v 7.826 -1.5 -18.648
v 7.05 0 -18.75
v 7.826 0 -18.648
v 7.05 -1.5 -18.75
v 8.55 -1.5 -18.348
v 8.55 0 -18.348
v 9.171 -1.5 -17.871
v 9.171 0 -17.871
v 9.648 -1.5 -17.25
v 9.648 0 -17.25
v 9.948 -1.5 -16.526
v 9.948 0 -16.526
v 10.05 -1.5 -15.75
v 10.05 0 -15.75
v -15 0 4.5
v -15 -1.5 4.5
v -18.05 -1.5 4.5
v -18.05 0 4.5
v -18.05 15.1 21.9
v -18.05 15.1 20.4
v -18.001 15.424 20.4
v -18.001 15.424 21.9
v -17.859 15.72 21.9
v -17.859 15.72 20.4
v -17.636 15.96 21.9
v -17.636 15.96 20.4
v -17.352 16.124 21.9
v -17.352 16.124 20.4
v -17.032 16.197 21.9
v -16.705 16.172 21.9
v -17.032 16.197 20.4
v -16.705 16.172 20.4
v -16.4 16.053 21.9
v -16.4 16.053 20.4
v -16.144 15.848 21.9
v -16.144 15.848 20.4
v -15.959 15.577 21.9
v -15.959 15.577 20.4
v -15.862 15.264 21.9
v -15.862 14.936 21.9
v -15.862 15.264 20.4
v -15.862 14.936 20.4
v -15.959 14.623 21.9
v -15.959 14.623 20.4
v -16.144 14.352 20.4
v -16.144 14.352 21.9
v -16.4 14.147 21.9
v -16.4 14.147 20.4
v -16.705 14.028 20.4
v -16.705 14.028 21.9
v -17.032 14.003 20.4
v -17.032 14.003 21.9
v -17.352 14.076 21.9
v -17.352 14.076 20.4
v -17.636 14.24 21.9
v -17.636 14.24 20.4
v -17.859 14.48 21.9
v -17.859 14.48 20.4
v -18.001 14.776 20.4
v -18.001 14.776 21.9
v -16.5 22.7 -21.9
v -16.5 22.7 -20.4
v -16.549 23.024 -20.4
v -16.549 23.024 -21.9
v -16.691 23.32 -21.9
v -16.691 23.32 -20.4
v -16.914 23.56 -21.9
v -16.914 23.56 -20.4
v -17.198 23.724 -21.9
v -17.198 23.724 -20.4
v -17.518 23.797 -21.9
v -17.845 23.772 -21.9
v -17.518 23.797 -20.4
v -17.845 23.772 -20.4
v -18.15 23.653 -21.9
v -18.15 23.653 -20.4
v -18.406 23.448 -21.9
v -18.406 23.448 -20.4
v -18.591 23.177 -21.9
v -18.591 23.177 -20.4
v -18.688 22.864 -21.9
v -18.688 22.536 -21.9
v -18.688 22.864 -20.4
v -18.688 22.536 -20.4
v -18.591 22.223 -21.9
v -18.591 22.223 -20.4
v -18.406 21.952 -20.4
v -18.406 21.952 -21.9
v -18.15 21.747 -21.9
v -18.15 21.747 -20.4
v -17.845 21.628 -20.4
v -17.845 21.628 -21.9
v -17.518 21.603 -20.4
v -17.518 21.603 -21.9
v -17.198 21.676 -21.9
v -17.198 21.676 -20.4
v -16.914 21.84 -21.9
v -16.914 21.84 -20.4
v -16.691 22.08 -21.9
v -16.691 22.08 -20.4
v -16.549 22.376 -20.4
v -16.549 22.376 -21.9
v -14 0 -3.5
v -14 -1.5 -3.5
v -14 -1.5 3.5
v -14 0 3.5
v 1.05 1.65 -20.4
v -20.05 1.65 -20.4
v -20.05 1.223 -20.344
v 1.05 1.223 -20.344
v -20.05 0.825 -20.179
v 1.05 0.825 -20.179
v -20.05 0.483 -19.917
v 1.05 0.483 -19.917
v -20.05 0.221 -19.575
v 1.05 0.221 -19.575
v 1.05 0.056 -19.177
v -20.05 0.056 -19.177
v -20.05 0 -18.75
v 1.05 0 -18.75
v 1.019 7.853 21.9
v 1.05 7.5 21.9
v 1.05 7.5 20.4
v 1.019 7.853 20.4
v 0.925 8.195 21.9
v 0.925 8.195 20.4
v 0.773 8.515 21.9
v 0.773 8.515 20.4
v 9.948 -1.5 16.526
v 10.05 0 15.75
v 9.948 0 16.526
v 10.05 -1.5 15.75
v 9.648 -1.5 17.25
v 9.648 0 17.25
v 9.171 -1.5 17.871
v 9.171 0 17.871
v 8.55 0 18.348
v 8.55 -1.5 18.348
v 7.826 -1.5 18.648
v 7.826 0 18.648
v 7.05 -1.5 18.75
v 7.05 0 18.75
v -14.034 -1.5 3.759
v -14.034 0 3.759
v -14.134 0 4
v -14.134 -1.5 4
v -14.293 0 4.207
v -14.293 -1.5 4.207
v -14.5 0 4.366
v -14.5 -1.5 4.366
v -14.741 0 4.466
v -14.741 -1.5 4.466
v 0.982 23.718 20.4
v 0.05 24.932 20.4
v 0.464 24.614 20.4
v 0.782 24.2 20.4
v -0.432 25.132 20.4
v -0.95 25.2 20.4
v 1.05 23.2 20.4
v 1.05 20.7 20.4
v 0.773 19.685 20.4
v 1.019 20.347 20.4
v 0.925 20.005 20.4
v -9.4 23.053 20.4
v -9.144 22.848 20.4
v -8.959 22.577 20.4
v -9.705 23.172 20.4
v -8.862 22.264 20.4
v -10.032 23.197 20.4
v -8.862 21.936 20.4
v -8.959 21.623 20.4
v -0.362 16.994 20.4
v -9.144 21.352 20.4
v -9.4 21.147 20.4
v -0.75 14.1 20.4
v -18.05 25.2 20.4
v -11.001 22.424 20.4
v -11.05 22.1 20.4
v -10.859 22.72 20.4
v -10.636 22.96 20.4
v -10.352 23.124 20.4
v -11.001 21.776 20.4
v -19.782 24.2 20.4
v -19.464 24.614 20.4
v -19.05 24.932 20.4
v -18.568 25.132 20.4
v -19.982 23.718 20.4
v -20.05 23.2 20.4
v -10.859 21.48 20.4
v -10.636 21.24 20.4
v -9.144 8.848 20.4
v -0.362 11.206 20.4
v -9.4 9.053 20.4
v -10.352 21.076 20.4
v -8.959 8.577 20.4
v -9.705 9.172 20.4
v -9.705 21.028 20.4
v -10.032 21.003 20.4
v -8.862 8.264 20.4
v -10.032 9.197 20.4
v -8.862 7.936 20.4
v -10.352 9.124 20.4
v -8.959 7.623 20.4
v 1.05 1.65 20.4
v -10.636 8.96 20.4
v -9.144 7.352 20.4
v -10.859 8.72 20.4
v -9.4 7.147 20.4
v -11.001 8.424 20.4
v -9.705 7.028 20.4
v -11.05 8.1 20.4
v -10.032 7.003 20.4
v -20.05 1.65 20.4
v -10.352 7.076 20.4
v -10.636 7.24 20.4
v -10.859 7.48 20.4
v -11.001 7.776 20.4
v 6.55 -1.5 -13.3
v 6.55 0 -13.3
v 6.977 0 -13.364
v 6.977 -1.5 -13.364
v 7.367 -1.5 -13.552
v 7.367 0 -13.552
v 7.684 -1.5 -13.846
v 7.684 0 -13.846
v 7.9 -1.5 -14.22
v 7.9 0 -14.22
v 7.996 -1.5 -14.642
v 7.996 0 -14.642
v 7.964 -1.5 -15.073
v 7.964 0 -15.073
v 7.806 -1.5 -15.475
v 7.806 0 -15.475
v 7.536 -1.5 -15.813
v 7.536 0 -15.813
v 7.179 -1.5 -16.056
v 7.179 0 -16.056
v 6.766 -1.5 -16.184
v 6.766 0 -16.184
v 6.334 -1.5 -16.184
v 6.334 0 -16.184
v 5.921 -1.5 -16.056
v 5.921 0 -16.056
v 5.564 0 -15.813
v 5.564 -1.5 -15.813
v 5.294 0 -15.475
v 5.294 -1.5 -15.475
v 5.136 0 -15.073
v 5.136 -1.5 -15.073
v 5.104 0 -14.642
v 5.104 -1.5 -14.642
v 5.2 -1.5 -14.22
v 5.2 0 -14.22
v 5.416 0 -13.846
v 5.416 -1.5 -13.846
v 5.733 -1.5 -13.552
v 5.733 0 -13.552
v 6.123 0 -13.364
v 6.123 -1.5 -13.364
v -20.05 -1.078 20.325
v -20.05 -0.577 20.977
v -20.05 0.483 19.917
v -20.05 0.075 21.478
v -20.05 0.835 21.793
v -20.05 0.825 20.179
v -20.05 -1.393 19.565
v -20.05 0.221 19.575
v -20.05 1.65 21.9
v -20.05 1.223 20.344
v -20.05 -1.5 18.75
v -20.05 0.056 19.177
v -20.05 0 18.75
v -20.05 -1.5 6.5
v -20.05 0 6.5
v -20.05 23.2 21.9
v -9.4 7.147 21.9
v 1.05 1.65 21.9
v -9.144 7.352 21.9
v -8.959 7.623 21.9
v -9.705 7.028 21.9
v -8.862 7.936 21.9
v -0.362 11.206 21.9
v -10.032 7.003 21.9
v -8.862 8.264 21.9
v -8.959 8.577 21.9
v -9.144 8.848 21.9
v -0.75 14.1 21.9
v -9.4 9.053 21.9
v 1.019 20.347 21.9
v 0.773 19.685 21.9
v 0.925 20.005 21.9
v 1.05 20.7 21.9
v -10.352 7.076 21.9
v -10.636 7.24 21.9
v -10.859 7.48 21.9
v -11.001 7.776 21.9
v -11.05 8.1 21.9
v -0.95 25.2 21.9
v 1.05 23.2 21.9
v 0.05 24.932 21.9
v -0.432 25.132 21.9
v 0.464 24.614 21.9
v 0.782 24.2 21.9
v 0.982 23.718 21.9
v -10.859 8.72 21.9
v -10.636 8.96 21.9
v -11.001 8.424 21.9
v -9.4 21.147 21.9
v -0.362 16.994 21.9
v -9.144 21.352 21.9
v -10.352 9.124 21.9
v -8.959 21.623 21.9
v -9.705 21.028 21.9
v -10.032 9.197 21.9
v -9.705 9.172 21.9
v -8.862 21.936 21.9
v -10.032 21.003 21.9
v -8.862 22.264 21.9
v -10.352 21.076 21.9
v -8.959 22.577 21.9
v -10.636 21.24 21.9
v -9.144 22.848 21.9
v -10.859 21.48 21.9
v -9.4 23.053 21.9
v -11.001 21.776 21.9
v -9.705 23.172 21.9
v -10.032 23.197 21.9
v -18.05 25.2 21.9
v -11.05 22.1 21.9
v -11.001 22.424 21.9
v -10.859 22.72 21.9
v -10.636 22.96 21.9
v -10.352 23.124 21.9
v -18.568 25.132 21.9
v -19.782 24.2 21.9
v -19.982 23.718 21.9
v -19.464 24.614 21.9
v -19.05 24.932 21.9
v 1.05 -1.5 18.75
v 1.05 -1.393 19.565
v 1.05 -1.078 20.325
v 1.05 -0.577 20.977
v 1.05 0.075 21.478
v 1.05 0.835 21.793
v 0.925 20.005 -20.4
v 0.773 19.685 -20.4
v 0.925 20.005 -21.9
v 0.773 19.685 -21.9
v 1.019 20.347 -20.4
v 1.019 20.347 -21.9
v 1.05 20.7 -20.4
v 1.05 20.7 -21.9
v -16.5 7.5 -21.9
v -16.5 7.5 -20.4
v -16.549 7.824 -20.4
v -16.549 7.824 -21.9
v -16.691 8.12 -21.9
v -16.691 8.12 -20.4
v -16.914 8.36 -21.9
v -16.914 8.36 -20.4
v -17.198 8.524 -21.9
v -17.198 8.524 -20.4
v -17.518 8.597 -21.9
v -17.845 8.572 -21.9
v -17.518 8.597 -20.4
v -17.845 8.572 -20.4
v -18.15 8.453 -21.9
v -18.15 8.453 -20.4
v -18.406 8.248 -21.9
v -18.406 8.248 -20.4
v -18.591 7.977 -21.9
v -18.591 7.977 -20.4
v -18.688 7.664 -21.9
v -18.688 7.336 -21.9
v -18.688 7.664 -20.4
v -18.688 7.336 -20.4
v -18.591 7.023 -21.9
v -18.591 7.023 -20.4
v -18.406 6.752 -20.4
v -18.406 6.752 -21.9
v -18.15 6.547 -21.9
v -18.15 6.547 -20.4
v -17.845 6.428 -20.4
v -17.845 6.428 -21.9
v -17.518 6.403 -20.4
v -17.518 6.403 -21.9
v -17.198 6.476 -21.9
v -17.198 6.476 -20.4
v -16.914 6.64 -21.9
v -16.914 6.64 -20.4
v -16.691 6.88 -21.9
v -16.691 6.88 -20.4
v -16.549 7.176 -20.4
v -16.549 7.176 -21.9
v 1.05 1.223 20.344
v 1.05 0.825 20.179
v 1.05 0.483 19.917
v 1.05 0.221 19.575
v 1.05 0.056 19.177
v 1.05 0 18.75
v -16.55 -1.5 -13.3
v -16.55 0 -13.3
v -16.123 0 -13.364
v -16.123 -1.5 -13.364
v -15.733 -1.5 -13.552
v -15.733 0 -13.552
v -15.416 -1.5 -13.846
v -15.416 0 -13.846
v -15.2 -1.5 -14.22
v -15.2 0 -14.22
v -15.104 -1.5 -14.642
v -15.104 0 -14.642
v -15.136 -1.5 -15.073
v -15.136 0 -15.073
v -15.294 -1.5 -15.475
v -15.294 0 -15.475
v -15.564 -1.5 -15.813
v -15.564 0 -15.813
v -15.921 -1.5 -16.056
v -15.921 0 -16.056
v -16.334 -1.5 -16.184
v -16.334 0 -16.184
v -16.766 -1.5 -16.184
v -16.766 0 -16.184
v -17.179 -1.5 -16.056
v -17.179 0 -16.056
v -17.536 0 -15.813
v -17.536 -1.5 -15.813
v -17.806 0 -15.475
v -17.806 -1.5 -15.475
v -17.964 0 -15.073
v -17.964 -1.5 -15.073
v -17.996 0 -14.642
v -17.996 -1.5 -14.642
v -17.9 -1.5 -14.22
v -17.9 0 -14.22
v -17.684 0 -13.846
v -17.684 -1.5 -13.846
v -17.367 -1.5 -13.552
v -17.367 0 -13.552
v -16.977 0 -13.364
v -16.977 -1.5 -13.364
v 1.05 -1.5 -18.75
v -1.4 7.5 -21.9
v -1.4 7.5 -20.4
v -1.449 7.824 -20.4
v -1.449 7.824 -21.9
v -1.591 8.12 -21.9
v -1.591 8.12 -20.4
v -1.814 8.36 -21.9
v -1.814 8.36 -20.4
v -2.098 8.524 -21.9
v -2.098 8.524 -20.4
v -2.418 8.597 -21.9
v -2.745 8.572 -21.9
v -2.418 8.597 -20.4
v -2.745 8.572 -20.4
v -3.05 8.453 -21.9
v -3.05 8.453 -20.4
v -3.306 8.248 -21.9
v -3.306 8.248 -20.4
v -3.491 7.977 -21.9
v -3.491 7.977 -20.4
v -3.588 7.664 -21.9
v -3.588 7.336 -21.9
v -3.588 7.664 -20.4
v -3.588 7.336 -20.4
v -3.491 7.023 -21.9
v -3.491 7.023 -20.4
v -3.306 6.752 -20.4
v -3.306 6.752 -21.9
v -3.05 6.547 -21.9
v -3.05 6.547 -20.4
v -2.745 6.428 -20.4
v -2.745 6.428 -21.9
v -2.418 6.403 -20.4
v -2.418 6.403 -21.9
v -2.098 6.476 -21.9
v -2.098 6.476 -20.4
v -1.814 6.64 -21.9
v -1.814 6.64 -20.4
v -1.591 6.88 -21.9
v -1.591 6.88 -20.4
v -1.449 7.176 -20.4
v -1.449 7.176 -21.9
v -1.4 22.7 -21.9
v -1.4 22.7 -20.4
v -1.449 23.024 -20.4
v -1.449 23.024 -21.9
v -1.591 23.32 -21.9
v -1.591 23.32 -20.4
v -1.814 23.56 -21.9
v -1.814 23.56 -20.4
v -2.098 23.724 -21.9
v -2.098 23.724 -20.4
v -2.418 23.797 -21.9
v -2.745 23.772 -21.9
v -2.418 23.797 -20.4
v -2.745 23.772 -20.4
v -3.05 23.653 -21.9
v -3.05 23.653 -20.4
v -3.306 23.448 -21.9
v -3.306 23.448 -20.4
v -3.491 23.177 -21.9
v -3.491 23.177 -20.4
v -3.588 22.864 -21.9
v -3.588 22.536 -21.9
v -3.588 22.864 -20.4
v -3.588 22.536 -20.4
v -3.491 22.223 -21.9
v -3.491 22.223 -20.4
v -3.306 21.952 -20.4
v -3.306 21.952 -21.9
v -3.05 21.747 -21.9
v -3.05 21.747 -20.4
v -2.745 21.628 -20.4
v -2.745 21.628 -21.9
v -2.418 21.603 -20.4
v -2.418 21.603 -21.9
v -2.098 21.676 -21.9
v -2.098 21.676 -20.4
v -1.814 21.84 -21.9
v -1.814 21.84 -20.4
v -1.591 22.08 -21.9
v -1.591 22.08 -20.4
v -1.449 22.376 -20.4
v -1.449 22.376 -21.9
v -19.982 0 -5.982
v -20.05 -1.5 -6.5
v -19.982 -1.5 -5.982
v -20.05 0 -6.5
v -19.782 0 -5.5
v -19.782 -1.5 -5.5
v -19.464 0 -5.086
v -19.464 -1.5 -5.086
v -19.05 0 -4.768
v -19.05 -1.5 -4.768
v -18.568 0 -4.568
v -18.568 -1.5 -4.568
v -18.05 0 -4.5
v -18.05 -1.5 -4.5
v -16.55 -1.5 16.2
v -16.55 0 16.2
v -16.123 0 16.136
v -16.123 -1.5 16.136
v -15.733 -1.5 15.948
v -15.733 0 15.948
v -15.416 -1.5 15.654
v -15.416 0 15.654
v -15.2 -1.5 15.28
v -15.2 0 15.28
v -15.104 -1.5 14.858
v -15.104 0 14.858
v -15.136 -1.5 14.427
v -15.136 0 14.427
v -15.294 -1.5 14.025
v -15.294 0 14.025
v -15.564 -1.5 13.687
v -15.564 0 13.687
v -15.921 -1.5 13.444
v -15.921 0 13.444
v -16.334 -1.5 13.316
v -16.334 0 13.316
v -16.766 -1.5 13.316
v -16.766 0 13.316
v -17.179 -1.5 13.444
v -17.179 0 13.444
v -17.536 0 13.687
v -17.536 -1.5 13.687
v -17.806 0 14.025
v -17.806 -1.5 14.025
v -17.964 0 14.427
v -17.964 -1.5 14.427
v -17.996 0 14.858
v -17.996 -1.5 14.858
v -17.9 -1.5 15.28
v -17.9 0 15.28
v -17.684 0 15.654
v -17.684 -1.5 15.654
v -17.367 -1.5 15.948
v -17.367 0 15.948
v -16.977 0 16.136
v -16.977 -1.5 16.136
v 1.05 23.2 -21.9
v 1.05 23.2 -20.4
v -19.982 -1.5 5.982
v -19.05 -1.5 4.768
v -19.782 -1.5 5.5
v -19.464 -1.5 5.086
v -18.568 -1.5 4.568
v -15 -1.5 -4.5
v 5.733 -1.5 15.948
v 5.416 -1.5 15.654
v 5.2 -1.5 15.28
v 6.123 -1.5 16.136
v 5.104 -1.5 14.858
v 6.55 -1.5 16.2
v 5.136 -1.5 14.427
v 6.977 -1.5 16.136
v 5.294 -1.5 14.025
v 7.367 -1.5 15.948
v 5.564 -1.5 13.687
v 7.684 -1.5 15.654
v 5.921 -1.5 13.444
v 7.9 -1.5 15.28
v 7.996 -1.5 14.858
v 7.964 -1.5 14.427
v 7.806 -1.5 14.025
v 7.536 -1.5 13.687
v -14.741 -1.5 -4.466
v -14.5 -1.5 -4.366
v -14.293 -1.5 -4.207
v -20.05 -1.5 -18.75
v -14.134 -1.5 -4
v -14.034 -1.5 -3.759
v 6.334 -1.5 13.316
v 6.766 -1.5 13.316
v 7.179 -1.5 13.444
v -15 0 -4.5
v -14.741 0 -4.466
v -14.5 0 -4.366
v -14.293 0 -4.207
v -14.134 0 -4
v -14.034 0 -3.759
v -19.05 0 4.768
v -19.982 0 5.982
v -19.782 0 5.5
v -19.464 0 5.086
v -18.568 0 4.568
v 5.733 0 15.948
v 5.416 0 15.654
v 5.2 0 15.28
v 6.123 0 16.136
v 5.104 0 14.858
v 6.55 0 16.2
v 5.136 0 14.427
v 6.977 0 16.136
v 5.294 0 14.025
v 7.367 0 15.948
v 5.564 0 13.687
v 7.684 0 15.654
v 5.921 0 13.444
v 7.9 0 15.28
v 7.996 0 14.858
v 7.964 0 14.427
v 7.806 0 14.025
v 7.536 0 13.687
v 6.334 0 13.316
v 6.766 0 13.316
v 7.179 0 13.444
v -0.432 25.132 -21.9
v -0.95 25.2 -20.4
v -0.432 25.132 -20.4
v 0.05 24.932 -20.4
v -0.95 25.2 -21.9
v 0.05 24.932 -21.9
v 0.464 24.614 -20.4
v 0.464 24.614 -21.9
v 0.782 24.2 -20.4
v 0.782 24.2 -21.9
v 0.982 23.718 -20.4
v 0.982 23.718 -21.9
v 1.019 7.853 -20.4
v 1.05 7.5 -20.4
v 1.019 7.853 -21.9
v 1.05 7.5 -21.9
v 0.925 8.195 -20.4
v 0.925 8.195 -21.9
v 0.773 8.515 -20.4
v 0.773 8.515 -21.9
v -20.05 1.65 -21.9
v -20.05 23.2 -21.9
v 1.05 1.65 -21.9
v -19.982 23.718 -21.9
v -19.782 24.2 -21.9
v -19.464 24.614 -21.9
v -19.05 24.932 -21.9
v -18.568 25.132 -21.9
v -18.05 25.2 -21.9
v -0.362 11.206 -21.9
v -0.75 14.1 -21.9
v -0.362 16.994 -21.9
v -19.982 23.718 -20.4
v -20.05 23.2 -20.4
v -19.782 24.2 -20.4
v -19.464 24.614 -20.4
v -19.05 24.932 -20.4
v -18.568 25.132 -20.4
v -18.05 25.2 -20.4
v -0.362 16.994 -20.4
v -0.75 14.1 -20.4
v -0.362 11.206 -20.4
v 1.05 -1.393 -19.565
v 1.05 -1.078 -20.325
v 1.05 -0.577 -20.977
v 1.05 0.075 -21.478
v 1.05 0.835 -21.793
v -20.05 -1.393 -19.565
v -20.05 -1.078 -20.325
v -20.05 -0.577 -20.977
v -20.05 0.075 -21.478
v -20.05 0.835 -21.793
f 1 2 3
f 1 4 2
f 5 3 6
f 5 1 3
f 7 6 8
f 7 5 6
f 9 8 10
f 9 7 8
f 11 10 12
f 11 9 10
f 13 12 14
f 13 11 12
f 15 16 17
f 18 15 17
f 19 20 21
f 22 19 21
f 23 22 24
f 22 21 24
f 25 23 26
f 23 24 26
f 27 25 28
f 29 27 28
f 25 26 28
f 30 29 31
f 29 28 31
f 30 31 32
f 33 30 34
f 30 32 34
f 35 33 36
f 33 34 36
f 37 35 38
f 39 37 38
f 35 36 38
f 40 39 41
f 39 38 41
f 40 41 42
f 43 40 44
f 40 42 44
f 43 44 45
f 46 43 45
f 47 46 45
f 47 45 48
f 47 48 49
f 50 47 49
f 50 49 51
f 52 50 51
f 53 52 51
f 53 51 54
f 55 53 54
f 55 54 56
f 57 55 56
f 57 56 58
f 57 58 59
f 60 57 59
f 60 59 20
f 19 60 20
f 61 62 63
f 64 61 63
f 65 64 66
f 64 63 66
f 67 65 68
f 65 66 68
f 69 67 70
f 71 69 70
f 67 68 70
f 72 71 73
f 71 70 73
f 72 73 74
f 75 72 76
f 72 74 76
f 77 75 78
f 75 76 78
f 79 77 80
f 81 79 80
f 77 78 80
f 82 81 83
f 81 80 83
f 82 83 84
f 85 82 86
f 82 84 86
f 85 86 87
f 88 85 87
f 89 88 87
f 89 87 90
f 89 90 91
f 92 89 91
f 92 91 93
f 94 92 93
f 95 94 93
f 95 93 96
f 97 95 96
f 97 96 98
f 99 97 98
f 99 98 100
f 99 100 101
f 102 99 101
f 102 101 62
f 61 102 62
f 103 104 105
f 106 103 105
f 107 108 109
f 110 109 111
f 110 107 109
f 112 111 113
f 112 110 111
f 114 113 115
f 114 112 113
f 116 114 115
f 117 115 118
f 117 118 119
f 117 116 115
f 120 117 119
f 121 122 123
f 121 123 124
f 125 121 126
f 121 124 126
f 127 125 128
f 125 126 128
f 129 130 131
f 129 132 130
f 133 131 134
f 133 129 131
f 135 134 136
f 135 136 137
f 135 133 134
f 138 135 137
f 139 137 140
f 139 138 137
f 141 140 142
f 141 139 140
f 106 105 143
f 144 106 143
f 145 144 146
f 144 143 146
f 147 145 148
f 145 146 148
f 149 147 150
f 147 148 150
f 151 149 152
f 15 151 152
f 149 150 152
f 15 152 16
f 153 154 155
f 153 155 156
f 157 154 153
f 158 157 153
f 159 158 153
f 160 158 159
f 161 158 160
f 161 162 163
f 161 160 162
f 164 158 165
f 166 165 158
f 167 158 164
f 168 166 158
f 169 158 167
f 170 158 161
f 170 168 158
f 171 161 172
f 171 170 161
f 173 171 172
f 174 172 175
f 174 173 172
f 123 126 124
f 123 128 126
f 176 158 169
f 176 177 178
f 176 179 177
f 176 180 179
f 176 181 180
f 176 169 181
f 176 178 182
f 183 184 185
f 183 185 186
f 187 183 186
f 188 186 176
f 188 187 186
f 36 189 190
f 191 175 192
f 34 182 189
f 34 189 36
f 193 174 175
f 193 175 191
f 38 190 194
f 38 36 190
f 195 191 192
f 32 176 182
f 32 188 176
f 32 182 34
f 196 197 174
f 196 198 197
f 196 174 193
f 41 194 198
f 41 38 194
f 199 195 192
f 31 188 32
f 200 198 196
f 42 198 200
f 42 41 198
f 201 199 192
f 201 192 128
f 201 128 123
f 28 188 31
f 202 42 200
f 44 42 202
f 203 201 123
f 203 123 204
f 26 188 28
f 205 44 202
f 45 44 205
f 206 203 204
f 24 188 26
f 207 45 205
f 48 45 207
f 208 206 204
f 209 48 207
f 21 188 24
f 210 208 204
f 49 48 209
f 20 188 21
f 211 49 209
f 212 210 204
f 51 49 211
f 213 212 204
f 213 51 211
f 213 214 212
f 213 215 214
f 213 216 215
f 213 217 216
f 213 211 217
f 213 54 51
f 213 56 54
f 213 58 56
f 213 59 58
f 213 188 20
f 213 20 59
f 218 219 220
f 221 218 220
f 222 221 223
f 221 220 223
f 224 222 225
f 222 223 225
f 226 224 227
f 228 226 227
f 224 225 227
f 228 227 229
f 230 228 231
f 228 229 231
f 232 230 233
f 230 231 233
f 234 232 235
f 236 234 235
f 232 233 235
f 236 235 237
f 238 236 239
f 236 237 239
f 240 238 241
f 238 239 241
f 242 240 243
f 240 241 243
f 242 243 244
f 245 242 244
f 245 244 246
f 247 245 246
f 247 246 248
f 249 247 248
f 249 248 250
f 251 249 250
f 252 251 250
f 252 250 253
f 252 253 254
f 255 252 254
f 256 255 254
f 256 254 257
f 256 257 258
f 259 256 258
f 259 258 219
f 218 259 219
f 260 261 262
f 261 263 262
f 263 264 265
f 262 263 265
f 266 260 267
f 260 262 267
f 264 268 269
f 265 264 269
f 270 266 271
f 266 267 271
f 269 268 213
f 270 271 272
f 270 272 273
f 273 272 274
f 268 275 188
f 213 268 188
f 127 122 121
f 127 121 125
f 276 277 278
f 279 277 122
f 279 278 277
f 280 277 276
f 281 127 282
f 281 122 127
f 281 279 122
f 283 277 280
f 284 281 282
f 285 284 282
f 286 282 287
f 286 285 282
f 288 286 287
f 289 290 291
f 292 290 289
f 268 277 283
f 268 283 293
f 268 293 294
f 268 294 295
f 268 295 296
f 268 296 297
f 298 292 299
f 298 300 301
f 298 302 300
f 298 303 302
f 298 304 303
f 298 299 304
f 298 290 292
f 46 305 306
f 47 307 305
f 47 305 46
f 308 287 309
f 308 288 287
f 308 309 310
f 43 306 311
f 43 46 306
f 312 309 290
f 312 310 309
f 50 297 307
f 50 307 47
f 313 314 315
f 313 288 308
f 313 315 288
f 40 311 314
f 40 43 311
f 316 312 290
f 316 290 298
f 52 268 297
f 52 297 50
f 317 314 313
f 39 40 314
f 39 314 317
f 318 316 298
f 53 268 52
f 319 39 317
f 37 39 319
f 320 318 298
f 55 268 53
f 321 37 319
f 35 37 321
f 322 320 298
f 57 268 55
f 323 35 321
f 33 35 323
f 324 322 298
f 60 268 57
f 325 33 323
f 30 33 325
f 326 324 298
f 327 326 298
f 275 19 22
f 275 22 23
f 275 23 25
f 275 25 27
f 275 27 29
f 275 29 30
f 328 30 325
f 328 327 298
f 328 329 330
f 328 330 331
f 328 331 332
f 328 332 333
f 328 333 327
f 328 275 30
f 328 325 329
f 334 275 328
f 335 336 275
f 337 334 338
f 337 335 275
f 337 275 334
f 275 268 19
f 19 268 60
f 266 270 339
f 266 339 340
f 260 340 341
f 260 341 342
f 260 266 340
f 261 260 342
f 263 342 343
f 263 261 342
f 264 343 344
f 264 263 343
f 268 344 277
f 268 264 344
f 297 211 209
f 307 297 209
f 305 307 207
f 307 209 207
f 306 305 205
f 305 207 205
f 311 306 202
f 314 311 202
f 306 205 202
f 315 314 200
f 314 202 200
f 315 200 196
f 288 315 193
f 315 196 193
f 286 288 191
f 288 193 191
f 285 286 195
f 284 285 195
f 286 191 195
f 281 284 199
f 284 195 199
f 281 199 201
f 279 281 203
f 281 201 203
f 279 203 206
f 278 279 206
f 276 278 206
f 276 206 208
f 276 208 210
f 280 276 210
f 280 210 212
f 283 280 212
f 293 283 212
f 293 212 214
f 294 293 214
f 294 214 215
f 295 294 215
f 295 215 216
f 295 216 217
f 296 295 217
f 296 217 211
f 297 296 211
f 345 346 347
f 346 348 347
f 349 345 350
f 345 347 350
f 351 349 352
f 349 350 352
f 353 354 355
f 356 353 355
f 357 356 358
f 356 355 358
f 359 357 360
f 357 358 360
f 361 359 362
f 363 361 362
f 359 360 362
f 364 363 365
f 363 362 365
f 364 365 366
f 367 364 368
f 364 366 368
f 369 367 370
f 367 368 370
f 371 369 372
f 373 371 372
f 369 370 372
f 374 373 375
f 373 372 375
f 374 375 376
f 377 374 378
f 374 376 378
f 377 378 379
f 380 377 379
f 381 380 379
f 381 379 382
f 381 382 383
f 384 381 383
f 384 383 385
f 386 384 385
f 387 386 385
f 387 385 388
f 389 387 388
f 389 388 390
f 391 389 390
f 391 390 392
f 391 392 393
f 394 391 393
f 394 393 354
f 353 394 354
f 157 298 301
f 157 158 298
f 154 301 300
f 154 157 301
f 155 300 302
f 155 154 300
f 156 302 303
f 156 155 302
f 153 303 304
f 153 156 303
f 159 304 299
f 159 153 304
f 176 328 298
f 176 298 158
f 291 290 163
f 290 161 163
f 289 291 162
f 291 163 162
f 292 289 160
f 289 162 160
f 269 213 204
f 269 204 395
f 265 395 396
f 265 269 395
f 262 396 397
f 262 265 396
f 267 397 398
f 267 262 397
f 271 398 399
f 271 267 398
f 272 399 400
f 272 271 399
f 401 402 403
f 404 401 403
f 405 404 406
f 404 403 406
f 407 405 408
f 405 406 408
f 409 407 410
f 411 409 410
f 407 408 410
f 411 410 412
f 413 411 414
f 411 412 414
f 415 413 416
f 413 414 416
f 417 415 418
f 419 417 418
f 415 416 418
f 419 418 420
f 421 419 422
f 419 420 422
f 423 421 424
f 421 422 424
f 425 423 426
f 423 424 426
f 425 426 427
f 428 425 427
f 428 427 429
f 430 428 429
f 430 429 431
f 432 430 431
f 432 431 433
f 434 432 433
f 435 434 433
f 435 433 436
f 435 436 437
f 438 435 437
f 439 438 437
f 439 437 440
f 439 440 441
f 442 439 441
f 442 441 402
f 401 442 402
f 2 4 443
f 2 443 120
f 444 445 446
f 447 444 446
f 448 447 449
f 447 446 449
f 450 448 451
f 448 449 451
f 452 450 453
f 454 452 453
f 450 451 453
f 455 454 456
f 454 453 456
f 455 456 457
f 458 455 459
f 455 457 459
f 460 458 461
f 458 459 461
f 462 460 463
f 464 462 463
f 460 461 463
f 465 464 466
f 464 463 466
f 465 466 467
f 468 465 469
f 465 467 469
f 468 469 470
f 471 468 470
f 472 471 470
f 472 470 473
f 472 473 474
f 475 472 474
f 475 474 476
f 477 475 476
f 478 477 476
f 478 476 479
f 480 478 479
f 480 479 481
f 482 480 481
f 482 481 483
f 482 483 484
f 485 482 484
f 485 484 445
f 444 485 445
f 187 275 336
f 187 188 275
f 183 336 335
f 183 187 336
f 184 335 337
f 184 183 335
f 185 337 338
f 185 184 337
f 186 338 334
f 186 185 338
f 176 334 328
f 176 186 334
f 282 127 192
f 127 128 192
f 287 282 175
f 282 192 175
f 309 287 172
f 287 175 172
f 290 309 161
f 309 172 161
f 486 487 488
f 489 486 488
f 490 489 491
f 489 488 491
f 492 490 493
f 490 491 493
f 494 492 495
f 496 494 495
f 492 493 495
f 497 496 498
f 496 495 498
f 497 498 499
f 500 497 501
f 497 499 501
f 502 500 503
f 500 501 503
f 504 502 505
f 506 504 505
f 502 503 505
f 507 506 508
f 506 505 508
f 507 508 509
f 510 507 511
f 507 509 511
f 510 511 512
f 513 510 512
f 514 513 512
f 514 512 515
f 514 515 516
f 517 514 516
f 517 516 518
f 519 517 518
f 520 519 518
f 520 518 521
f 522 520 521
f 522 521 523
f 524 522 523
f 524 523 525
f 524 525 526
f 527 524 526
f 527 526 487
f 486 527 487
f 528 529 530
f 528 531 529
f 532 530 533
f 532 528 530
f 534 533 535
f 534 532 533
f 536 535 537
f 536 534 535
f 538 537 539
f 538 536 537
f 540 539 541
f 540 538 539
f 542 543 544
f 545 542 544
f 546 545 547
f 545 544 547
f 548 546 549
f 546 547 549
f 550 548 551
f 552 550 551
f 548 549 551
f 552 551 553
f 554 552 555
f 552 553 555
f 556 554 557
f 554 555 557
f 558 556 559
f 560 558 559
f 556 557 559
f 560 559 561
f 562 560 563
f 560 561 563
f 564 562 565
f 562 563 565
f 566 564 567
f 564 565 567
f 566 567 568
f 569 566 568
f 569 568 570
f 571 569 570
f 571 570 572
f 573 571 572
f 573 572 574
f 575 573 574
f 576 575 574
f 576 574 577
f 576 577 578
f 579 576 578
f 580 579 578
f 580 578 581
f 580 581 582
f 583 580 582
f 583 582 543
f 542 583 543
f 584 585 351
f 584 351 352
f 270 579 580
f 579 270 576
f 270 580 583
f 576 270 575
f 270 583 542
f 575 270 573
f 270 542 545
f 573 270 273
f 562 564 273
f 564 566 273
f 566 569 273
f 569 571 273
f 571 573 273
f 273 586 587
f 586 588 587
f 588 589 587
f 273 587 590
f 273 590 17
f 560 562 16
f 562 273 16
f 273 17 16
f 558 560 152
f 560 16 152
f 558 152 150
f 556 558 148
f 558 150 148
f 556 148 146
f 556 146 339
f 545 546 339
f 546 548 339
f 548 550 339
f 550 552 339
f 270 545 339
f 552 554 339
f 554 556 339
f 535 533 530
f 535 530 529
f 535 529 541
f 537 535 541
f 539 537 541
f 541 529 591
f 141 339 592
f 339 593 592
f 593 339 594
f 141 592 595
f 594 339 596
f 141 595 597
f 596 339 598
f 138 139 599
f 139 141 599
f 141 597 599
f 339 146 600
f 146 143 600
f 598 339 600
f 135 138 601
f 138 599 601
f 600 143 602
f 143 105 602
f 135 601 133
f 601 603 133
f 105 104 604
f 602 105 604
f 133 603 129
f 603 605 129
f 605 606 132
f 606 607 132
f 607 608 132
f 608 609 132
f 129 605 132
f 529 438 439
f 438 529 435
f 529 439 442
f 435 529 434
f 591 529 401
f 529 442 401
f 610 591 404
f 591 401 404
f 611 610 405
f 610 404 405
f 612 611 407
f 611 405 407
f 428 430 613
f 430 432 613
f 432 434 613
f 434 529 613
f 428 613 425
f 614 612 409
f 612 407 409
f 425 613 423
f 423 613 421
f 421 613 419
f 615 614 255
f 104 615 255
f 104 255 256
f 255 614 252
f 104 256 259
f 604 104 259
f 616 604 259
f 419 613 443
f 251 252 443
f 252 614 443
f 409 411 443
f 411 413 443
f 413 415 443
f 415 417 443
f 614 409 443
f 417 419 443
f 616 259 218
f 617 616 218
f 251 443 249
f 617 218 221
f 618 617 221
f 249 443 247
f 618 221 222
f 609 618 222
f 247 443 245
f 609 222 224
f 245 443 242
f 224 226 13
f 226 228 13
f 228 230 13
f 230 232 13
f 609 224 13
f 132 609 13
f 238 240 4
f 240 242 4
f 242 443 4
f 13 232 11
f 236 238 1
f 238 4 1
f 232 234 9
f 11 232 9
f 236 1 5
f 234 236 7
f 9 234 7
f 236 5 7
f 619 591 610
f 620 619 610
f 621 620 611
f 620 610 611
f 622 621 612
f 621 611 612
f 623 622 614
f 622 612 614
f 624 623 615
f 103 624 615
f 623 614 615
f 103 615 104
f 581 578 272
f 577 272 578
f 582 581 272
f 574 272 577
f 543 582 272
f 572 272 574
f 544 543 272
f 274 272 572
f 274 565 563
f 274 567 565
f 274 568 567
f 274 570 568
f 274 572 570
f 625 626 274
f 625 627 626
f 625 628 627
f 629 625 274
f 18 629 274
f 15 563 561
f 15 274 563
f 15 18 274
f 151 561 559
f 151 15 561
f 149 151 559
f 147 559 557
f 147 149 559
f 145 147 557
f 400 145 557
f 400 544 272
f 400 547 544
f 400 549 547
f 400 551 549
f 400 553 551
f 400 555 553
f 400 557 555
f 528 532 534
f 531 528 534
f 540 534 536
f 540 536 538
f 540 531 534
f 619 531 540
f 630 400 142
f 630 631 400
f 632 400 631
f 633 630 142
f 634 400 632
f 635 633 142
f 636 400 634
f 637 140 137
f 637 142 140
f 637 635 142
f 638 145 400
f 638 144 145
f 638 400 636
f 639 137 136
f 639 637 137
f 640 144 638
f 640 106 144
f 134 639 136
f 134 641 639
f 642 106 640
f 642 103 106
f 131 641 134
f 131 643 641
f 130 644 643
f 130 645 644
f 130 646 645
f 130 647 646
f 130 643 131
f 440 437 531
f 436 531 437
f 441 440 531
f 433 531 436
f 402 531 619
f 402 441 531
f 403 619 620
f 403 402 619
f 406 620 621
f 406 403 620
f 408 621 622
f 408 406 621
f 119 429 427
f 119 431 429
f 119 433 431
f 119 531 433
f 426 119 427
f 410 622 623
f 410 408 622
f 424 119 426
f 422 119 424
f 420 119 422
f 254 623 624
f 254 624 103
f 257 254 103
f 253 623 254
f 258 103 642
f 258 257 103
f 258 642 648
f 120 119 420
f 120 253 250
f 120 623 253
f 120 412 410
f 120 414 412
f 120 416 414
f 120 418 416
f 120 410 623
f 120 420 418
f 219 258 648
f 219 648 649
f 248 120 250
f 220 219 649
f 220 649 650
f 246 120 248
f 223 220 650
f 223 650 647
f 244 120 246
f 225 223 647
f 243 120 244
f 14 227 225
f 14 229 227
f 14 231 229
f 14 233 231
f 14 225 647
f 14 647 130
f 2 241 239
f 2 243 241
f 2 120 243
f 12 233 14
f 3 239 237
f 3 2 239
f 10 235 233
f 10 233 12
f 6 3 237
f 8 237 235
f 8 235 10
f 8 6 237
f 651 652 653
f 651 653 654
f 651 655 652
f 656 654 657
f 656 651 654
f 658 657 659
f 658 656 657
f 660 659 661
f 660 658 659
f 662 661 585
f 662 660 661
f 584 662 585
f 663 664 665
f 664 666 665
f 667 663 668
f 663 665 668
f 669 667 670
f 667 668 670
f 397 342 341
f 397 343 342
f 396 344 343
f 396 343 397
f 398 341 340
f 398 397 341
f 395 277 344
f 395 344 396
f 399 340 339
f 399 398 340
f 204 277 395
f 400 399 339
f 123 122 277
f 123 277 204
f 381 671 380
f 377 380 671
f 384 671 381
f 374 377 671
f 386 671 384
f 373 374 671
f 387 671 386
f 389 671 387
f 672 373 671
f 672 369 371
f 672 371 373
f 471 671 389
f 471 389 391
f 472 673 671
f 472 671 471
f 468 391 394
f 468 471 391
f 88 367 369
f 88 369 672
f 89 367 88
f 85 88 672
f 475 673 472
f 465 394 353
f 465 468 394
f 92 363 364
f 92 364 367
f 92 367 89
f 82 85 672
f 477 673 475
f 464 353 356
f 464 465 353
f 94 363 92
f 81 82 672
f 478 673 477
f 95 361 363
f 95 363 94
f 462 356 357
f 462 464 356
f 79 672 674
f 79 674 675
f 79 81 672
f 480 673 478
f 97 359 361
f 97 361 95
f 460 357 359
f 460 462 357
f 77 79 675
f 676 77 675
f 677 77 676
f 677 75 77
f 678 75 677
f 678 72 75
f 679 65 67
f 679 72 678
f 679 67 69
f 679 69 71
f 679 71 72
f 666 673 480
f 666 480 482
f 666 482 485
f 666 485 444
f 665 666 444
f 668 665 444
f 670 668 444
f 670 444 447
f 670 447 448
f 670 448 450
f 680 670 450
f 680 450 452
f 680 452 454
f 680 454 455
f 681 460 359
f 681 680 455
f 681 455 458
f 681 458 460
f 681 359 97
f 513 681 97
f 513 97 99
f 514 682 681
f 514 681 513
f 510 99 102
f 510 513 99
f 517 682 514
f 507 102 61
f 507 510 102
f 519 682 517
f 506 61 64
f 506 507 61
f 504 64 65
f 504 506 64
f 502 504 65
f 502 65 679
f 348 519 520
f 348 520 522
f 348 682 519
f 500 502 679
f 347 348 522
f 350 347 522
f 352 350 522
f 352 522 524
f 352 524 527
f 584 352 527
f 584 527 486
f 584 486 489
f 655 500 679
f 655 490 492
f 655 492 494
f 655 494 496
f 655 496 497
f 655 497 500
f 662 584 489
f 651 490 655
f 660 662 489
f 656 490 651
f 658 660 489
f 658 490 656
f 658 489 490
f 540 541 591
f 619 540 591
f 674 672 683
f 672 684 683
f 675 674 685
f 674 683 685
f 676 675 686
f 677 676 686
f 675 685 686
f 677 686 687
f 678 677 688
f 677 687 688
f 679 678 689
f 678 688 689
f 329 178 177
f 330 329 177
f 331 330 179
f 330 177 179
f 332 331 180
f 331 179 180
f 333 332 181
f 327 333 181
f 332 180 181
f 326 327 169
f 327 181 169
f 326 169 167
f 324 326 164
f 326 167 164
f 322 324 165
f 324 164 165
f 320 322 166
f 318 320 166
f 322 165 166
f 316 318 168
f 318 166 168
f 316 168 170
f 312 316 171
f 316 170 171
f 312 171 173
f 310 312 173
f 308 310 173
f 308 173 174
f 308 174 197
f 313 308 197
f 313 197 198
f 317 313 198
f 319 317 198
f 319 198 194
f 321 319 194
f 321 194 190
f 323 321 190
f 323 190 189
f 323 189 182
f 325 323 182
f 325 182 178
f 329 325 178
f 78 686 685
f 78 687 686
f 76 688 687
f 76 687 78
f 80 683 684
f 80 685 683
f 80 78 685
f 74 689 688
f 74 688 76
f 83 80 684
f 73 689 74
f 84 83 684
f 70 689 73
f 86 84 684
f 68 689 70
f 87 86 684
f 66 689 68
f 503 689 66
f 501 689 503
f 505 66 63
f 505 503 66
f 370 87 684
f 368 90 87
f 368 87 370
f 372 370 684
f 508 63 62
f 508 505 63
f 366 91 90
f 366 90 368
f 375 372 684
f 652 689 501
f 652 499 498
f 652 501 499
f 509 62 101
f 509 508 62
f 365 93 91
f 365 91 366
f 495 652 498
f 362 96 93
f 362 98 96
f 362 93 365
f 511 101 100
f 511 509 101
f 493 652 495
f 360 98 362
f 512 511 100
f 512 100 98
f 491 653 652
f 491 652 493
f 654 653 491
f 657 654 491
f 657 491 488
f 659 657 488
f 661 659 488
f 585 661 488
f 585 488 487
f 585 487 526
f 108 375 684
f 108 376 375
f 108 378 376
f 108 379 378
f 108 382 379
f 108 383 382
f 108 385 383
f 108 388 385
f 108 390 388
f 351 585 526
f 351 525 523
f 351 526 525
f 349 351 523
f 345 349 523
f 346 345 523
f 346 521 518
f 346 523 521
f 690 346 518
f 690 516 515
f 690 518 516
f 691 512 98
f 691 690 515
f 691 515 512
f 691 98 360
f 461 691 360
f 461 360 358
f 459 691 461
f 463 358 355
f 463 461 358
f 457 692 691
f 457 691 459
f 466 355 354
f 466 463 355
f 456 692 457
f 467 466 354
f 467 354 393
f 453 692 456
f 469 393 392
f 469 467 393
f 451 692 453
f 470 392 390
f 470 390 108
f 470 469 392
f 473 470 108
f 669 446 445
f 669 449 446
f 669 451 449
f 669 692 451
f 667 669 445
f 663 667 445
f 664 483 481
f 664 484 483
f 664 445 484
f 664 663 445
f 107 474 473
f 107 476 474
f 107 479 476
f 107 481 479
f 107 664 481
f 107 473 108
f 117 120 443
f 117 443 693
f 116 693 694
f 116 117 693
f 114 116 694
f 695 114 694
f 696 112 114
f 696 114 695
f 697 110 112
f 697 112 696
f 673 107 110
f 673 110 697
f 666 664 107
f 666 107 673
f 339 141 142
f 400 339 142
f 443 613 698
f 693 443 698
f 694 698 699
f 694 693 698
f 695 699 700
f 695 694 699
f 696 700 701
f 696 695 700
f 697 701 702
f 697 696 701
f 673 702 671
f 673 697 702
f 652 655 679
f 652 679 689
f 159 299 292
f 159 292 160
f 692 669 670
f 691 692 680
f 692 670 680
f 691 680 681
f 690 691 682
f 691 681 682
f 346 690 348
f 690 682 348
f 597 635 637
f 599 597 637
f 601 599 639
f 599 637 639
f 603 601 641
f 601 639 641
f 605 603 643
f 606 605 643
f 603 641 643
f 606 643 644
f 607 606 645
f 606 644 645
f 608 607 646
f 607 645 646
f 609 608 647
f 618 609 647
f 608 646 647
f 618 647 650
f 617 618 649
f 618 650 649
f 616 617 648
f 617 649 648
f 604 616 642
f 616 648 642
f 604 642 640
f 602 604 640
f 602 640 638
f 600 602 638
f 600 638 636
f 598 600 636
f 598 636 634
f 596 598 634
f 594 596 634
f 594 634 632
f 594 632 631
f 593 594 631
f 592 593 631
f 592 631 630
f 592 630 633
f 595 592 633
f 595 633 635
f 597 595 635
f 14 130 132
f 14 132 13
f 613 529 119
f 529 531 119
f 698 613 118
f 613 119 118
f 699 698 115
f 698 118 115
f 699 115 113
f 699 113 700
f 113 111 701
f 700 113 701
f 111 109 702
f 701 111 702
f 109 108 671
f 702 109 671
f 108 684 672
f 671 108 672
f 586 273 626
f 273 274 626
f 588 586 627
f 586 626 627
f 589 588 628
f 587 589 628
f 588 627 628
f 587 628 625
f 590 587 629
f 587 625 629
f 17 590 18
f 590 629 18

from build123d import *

# Parameters (mm, degrees)
SKETCH1_W                      = 40.1
SKETCH1_H                      = 40.8
BASE_FLANGE1_DEPTH             = 1.5
EDGE_FLANGE2_STRIP_W           = 9.3
EDGE_FLANGE2_STRIP_H           = 1.5
EDGE_FLANGE2_STRIP_CUT_DEPTH   = 40.1
EDGE_FLANGE2_STRIP_2_W         = 9.3
EDGE_FLANGE2_STRIP_2_H         = 1.5
EDGE_FLANGE2_STRIP_CUT_2_DEPTH = 40.1
EDGE_FLANGE2_DEPTH             = 40.1
EDGE_FLANGE2_BEND_DEPTH        = 40.1
SKETCH23_W                     = 3.15
SKETCH23_H                     = 26.7
CUT_EXTRUDE3_DEPTH             = 19
SKETCH24_R                     = 11
CUT_EXTRUDE4_DEPTH             = 55.364349532
SKETCH26_W                     = 10
SKETCH26_H                     = 37.5
CUT_EXTRUDE5_DEPTH             = 39.944222935
SKETCH27_R                     = 1.45
CUT_EXTRUDE6_DEPTH             = 39.944222935
FILLET1_R                      = 3
FILLET2_R                      = 2
F_2_0MM_DOWEL_HOLE1_D          = 2.2
F_2_0MM_DOWEL_HOLE1_DEPTH      = 1.5
F_2_0MM_DOWEL_HOLE2_D          = 2.2
F_2_0MM_DOWEL_HOLE2_DEPTH      = 1.5
CUT_EXTRUDE7_DEPTH             = 40.93122212
FILLET3_R                      = 2


# Sheet-metal steps are written as plain solids
with BuildPart() as part:
    # Sketch1 → Base-Flange1 (new body)
    with BuildSketch(Plane(origin=(0, 0, 0), x_dir=(1, 0, 0), z_dir=(0, 1, 0))):
        Rectangle(SKETCH1_W, SKETCH1_H)
    extrude(amount=-BASE_FLANGE1_DEPTH)

    # Edge-Flange2 strip (across the edge) → Edge-Flange2 strip cut (cut)
    with BuildSketch(Plane(origin=(-20.05, 0, 20.4), x_dir=(0, 0, -1), z_dir=(1, 0, 0))):
        with Locations((-3, -0.75)):
            Rectangle(EDGE_FLANGE2_STRIP_W, EDGE_FLANGE2_STRIP_H)
    extrude(amount=EDGE_FLANGE2_STRIP_CUT_DEPTH, mode=Mode.SUBTRACT)

    # Edge-Flange2 strip 2 (across the edge) → Edge-Flange2 strip cut 2 (cut)
    with BuildSketch(Plane(origin=(20.05, 0, -20.4), x_dir=(0, 0, 1), z_dir=(-1, 0, 0))):
        with Locations((-3, -0.75)):
            Rectangle(EDGE_FLANGE2_STRIP_2_W, EDGE_FLANGE2_STRIP_2_H)
    extrude(amount=EDGE_FLANGE2_STRIP_CUT_2_DEPTH, mode=Mode.SUBTRACT)

    # Edge-Flange2 section (across the edge) → Edge-Flange2 (add)
    with BuildSketch(Plane(origin=(-20.05, 0, 20.4), x_dir=(0, 0, -1), z_dir=(1, 0, 0))):
        with BuildLine():
            Line((-1.5, 1.65), (-1.5, 25.2))
            Line((-1.5, 25.2), (0, 25.2))
            Line((0, 25.2), (0, 1.65))
            ThreePointArc((0, 1.65), (0.483273811, 0.483273811), (1.65, 0))
            Line((1.65, 0), (1.65, -1.5))
            ThreePointArc((1.65, -1.5), (-0.577386361, -0.577386361), (-1.5, 1.65))
        make_face()
    extrude(amount=EDGE_FLANGE2_DEPTH)

    # Edge-Flange2 section 2 (across the edge) → Edge-Flange2 bend (add)
    with BuildSketch(Plane(origin=(20.05, 0, -20.4), x_dir=(0, 0, 1), z_dir=(-1, 0, 0))):
        with BuildLine():
            Line((-1.5, 1.65), (-1.5, 25.2))
            Line((-1.5, 25.2), (0, 25.2))
            Line((0, 25.2), (0, 1.65))
            ThreePointArc((0, 1.65), (0.483273811, 0.483273811), (1.65, 0))
            Line((1.65, 0), (1.65, -1.5))
            ThreePointArc((1.65, -1.5), (-0.577386361, -0.577386361), (-1.5, 1.65))
        make_face()
    extrude(amount=EDGE_FLANGE2_BEND_DEPTH)

    # Sketch23 → Cut-Extrude3 (cut)
    with BuildSketch(Plane(origin=(20.05, 0, 0), x_dir=(0, 0, -1), z_dir=(1, 0, 0))):
        with Locations((-20.325, 11.85)):
            Rectangle(SKETCH23_W, SKETCH23_H)
        with Locations((20.325, 11.85)):
            Rectangle(SKETCH23_W, SKETCH23_H)
    extrude(amount=-CUT_EXTRUDE3_DEPTH, mode=Mode.SUBTRACT)

    # Sketch24 → Cut-Extrude4 (cut, through all)
    with BuildSketch(Plane(origin=(0, 0, -21.9), x_dir=(-1, 0, 0), z_dir=(0, 0, -1))):
        with Locations((-10.25, 14.1)):
            Circle(SKETCH24_R)
    extrude(amount=-CUT_EXTRUDE4_DEPTH, mode=Mode.SUBTRACT)

    # Sketch26 → Cut-Extrude5 (cut, through all)
    with BuildSketch(Plane(origin=(0, 0, 0), x_dir=(1, 0, 0), z_dir=(0, 1, 0))):
        with Locations((15.05, 0)):
            Rectangle(SKETCH26_W, SKETCH26_H)
    extrude(amount=-CUT_EXTRUDE5_DEPTH, mode=Mode.SUBTRACT)

    # Sketch27 → Cut-Extrude6 (cut, through all)
    with BuildSketch(Plane(origin=(0, 0, 0), x_dir=(1, 0, 0), z_dir=(0, 1, 0))):
        with Locations(Location((-16.55, 14.75, 0), (0, 0, 270))):
            Circle(SKETCH27_R)
        with Locations(Location((6.55, 14.75, 0), (0, 0, 270))):
            Circle(SKETCH27_R)
        with Locations(Location((6.55, -14.75, 0), (0, 0, 270))):
            Circle(SKETCH27_R)
        with Locations(Location((-16.55, -14.75, 0), (0, 0, 270))):
            Circle(SKETCH27_R)
    extrude(amount=-CUT_EXTRUDE6_DEPTH, mode=Mode.SUBTRACT)

    # Fillet1
    fillet1_edges = [part.edges().sort_by_distance(p)[0] for p in [
        (10.05, -0.75, 18.75),
        (10.05, -0.75, -18.75),
    ]]
    fillet(fillet1_edges, radius=FILLET1_R)

    # Fillet2
    fillet2_edges = [part.edges().sort_by_distance(p)[0] for p in [
        (1.05, 25.2, -21.15),
        (1.05, 20.129925373, 21.15),
        (1.05, 8.070074627, 21.15),
        (1.05, 20.129925373, -21.15),
        (1.05, 8.070074627, -21.15),
        (-20.05, 25.2, 21.15),
        (-20.05, 25.2, -21.15),
        (1.05, 25.2, 21.15),
    ]]
    fillet(fillet2_edges, radius=FILLET2_R)

    # Ø2.0mm Dowel Hole1
    with Locations(Plane(origin=(0, 0, -21.9), x_dir=(-1, 0, 0), z_dir=(0, 0, -1))):
        with Locations((2.5, 22.7), (17.6, 22.7), (2.5, 7.5), (17.6, 7.5)):
            Hole(F_2_0MM_DOWEL_HOLE1_D / 2, depth=F_2_0MM_DOWEL_HOLE1_DEPTH)

    # Ø2.0mm Dowel Hole2
    with Locations(Plane.XY.offset(21.9)):
        with Locations((-16.95, 15.1), (-9.95, 22.1), (-9.95, 8.1)):
            Hole(F_2_0MM_DOWEL_HOLE2_D / 2, depth=F_2_0MM_DOWEL_HOLE2_DEPTH)

    # Sketch32 → Cut-Extrude7 (cut, through all)
    with BuildSketch(Plane.XZ.offset(1.5)):
        with BuildLine():
            Line((-20.05, 4.5), (-20.05, -4.5))
            Line((-20.05, -4.5), (-15, -4.5))
            ThreePointArc((-15, -4.5), (-14.292893219, -4.207106781), (-14, -3.5))
            Line((-14, -3.5), (-14, 3.5))
            ThreePointArc((-14, 3.5), (-14.292893219, 4.207106781), (-15, 4.5))
            Line((-15, 4.5), (-20.05, 4.5))
        make_face()
    extrude(amount=-CUT_EXTRUDE7_DEPTH, mode=Mode.SUBTRACT)

    # Fillet3
    fillet3_edges = [part.edges().sort_by_distance(p)[0] for p in [
        (-20.05, -0.75, -4.5),
        (-20.05, -0.75, 4.5),
    ]]
    fillet(fillet3_edges, radius=FILLET3_R)


solid = part.part
